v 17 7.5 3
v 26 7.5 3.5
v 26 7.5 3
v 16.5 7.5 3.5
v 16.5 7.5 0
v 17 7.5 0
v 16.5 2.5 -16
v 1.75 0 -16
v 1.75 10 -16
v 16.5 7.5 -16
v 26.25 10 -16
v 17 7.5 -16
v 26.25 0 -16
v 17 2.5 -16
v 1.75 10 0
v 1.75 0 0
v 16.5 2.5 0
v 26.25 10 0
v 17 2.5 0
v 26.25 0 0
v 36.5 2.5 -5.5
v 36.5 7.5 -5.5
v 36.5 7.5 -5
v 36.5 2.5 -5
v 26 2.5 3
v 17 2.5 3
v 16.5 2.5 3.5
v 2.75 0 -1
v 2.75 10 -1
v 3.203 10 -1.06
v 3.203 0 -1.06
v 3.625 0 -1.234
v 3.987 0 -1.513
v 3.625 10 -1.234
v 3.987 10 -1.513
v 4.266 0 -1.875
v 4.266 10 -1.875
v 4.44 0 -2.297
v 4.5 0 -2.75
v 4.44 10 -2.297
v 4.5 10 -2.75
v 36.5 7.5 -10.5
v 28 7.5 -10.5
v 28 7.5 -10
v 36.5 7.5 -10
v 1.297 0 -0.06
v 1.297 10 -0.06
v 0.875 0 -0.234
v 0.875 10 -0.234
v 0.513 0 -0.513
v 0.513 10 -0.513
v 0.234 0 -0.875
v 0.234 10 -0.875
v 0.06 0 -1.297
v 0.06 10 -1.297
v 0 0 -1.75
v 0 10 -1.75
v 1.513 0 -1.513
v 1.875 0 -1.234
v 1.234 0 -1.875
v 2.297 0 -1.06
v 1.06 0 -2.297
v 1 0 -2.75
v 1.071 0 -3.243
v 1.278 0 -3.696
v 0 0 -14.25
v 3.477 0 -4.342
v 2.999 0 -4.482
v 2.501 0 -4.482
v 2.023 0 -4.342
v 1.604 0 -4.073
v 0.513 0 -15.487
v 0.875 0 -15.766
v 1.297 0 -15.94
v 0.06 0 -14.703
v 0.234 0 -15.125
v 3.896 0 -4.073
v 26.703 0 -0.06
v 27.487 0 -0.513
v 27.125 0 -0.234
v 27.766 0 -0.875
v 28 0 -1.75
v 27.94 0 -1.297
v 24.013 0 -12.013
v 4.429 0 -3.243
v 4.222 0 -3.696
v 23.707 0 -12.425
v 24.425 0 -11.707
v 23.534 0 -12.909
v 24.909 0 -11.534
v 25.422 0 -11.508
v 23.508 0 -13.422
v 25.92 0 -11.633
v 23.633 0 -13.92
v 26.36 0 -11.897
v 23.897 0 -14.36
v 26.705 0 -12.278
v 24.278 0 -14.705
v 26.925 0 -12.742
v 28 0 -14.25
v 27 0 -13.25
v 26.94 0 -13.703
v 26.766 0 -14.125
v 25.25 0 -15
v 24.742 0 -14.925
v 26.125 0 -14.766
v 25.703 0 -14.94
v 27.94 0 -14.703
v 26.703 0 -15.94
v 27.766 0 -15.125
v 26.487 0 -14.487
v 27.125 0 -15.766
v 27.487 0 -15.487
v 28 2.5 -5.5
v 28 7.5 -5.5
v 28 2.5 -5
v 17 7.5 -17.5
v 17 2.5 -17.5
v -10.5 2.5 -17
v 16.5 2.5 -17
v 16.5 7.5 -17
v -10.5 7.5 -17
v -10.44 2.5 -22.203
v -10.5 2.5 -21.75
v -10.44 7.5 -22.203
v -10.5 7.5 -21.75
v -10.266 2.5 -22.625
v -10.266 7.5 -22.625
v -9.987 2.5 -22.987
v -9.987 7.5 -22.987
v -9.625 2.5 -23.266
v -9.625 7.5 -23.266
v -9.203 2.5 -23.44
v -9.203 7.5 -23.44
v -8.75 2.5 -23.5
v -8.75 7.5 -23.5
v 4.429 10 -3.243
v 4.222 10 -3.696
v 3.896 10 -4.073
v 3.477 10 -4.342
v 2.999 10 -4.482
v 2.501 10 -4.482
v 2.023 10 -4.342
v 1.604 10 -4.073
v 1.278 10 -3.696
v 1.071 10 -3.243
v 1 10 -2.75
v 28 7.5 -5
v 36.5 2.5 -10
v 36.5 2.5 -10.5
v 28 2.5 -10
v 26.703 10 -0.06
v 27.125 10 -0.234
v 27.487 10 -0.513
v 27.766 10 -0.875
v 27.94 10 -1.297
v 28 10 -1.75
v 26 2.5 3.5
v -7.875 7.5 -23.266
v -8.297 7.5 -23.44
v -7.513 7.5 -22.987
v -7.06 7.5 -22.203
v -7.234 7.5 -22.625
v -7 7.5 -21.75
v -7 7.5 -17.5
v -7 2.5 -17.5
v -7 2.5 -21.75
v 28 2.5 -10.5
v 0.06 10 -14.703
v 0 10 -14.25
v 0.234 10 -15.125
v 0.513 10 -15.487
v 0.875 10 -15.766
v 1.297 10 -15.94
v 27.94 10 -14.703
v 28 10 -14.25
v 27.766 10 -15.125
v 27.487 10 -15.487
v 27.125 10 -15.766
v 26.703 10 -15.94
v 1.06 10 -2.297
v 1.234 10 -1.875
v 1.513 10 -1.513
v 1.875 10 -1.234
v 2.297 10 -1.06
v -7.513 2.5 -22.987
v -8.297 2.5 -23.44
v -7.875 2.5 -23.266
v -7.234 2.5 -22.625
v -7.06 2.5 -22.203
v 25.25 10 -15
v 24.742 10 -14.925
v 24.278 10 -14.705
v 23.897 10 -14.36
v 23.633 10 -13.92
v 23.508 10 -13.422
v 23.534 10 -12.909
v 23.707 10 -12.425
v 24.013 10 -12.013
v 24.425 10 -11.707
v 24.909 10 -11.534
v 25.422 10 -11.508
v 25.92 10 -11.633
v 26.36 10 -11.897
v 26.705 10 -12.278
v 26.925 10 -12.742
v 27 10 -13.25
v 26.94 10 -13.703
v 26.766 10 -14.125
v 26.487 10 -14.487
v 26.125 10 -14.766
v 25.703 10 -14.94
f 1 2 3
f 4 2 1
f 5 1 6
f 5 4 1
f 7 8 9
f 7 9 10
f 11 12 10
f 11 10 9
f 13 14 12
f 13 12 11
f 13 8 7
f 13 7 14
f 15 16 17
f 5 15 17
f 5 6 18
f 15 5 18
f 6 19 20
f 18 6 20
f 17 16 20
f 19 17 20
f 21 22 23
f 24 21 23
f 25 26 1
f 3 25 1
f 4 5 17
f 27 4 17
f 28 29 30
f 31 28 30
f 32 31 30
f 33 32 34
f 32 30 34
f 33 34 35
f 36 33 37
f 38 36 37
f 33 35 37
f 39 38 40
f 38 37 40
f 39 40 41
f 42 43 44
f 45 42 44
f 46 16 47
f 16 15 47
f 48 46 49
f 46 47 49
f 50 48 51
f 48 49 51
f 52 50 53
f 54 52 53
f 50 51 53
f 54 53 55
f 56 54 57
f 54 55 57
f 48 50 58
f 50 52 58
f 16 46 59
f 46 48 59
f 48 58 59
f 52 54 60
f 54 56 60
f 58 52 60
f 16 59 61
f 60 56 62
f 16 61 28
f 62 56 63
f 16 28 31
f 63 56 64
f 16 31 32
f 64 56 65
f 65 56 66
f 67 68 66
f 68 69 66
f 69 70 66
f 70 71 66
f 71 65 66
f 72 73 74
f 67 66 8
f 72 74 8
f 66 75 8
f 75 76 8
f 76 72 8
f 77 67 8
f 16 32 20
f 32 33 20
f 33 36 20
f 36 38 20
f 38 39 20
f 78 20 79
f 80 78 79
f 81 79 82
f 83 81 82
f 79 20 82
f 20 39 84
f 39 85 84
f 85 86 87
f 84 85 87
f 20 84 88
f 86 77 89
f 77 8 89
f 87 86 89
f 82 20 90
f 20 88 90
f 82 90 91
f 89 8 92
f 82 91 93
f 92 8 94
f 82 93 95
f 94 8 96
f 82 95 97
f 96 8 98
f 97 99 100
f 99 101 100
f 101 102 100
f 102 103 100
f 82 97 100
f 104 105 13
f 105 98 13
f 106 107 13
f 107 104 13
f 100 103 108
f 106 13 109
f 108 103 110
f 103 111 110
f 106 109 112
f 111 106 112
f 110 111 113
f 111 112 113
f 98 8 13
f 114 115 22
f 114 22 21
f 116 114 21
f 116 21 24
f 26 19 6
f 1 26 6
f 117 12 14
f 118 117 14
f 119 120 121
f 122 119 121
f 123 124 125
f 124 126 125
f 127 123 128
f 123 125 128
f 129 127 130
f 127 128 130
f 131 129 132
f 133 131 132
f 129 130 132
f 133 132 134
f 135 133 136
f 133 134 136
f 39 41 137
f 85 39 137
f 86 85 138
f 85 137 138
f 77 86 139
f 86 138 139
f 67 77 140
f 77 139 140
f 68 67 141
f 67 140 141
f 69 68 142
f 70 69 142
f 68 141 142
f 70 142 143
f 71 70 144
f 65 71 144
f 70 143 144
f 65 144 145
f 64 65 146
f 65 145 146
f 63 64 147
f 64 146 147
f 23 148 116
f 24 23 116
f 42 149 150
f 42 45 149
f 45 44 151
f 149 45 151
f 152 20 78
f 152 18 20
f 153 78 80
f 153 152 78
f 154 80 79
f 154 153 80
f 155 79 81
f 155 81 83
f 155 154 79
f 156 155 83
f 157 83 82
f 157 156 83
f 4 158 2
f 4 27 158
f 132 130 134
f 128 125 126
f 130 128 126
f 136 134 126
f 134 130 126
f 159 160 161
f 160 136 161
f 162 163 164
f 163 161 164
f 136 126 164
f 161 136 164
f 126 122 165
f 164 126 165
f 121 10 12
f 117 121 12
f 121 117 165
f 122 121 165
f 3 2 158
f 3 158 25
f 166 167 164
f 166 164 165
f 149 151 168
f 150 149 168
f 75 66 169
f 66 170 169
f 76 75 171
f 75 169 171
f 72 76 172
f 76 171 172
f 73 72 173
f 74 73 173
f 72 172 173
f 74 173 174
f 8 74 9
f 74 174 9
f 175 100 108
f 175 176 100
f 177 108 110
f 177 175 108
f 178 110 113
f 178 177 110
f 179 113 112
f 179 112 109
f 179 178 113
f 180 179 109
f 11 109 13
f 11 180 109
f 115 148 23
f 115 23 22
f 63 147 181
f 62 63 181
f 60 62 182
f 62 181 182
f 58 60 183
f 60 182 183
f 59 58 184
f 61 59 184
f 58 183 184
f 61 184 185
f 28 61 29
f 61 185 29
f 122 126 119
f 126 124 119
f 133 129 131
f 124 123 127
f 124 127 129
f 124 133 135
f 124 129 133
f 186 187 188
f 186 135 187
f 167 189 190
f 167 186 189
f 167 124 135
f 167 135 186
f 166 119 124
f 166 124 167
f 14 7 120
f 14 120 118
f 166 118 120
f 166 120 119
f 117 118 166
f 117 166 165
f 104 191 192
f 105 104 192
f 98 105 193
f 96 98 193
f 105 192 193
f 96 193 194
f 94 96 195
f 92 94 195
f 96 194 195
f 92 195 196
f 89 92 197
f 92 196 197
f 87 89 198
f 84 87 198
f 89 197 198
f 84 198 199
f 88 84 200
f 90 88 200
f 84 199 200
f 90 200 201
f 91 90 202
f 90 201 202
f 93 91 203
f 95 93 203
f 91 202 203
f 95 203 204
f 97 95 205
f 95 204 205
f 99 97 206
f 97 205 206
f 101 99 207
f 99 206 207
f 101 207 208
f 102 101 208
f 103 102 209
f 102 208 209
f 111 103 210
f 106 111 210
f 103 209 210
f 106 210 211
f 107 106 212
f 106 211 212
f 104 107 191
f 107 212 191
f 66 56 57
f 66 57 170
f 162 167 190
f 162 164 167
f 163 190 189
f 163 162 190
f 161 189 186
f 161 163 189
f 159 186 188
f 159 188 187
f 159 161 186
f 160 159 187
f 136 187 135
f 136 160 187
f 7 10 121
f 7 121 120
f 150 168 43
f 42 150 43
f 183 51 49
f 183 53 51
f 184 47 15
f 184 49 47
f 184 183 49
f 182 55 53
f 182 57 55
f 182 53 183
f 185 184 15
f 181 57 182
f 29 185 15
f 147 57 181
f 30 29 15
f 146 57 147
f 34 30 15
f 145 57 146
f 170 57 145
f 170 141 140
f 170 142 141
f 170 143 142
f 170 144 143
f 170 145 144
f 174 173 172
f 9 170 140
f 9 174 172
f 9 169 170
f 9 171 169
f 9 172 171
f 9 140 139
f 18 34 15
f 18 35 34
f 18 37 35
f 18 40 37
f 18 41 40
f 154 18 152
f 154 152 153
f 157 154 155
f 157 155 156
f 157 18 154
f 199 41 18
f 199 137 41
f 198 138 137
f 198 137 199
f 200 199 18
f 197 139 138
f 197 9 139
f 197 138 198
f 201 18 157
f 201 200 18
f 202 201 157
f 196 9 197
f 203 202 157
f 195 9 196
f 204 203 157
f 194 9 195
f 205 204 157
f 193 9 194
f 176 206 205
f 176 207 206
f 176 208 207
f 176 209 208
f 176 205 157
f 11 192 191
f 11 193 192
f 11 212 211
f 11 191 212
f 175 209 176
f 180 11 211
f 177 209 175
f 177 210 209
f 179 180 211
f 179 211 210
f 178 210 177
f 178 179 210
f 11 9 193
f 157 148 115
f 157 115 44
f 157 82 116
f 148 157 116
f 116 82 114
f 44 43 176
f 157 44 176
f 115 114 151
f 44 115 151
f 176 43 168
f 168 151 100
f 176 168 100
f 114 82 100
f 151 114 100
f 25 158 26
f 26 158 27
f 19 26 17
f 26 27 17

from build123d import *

# Parameters (mm, degrees)
SKETCH1_W           = 28
SKETCH1_H           = 16
BOSS_EXTRUDE1_DEPTH = 10
BOSS_EXTRUDE2_DEPTH = 1.5
SKETCH4_W           = 0.5
SKETCH4_H           = 5
BOSS_EXTRUDE3_DEPTH = 27
SKETCH6_W           = 3.5
SKETCH6_H           = 6
BOSS_EXTRUDE4_DEPTH = 5
FILLET1_R           = 1.75
BOSS_EXTRUDE5_DEPTH = 3.5
SKETCH8_W           = 0.5
SKETCH8_H           = 5
BOSS_EXTRUDE6_DEPTH = 9
BOSS_EXTRUDE7_DEPTH = 8.5
CUT_EXTRUDE1_DEPTH  = 45.547727215
CUT_EXTRUDE2_DEPTH  = 45.547727215
FILLET2_R           = 1.75


with BuildPart() as part:
    # Sketch1 → Boss-Extrude1 (new body)
    with BuildSketch(Plane(origin=(0, 0, 0), x_dir=(1, 0, 0), z_dir=(0, 1, 0))):
        with Locations((14, 8)):
            Rectangle(SKETCH1_W, SKETCH1_H)
    extrude(amount=BOSS_EXTRUDE1_DEPTH)

    # Sketch3 → Boss-Extrude2 (add)
    with BuildSketch(Plane(origin=(0, 0, -16), x_dir=(-1, 0, 0), z_dir=(0, 0, -1))):
        Polygon((-17, 2.5), (-17, 5), (-17, 7.5), (-16.5, 7.5), (-16.5, 2.5), align=None)
    extrude(amount=BOSS_EXTRUDE2_DEPTH)

    # Sketch4 → Boss-Extrude3 (add)
    with BuildSketch(Plane.ZY.offset(-16.5)):
        with Locations((-17.25, 5)):
            Rectangle(SKETCH4_W, SKETCH4_H)
    extrude(amount=BOSS_EXTRUDE3_DEPTH)

    # Sketch6 → Boss-Extrude4 (add)
    with BuildSketch(Plane.XZ.offset(-2.5)):
        with Locations((-8.75, -20.5)):
            Rectangle(SKETCH6_W, SKETCH6_H)
    extrude(amount=-BOSS_EXTRUDE4_DEPTH)

    # Fillet1
    fillet1_edges = [part.edges().sort_by_distance(p)[0] for p in [
        (-7, 5, -23.5),
        (-10.5, 5, -23.5),
    ]]
    fillet(fillet1_edges, radius=FILLET1_R - 0.0001)  # a hair under: the kernel refuses the full size

    # Sketch7 → Boss-Extrude5 (add)
    with BuildSketch(Plane.XY):
        Polygon((16.5, 2.5), (17, 2.5), (17, 5), (17, 7.5), (16.5, 7.5), align=None)
    extrude(amount=BOSS_EXTRUDE5_DEPTH)

    # Sketch8 → Boss-Extrude6 (add)
    with BuildSketch(Plane(origin=(17, 0, 0), x_dir=(0, 0, -1), z_dir=(1, 0, 0))):
        with Locations((-3.25, 5)):
            Rectangle(SKETCH8_W, SKETCH8_H)
    extrude(amount=BOSS_EXTRUDE6_DEPTH)

    # Sketch9 → Boss-Extrude7 (add)
    with BuildSketch(Plane(origin=(28, 0, 0), x_dir=(0, 0, -1), z_dir=(1, 0, 0))):
        Polygon((10, 2.5), (10.5, 2.5), (10.5, 5), (10.5, 7.5), (10, 7.5), align=None)
        Polygon((5, 5), (5, 7.5), (5.5, 7.5), (5.5, 2.5), (5, 2.5), align=None)
    extrude(amount=BOSS_EXTRUDE7_DEPTH)

    # Sketch10 → Cut-Extrude1 (cut, through all)
    with BuildSketch(Plane(origin=(0, 10, 0), x_dir=(1, 0, 0), z_dir=(0, 1, 0))):
        with BuildLine():
            ThreePointArc((25.25, 15), (24.012563133, 12.012563133), (27, 13.25))
            Line((27, 13.25), (25.25, 13.25))
            Line((25.25, 13.25), (25.25, 15))
        make_face()
        with BuildLine():
            Line((25.25, 13.25), (27, 13.25))
            ThreePointArc((27, 13.25), (26.487436867, 14.487436867), (25.25, 15))
            Line((25.25, 15), (25.25, 13.25))
        make_face()
    extrude(amount=-CUT_EXTRUDE1_DEPTH, mode=Mode.SUBTRACT)

    # Sketch11 → Cut-Extrude2 (cut, through all)
    with BuildSketch(Plane(origin=(0, 10, 0), x_dir=(1, 0, 0), z_dir=(0, 1, 0))):
        with BuildLine():
            ThreePointArc((4.5, 2.75), (2.75, 4.5), (1, 2.75))
            Line((1, 2.75), (2.75, 2.75))
            Line((2.75, 2.75), (2.75, 1))
            ThreePointArc((2.75, 1), (3.987436867, 1.512563133), (4.5, 2.75))
        make_face()
        with BuildLine():
            Line((2.75, 2.75), (1, 2.75))
            ThreePointArc((1, 2.75), (1.512563133, 1.512563133), (2.75, 1))
            Line((2.75, 1), (2.75, 2.75))
        make_face()
    extrude(amount=-CUT_EXTRUDE2_DEPTH, mode=Mode.SUBTRACT)

    # Fillet2
    fillet2_edges = [part.edges().sort_by_distance(p)[0] for p in [
        (0, 5, -16),
        (28, 5, -16),
        (28, 5, 0),
        (0, 5, 0),
    ]]
    fillet(fillet2_edges, radius=FILLET2_R)


solid = part.part
